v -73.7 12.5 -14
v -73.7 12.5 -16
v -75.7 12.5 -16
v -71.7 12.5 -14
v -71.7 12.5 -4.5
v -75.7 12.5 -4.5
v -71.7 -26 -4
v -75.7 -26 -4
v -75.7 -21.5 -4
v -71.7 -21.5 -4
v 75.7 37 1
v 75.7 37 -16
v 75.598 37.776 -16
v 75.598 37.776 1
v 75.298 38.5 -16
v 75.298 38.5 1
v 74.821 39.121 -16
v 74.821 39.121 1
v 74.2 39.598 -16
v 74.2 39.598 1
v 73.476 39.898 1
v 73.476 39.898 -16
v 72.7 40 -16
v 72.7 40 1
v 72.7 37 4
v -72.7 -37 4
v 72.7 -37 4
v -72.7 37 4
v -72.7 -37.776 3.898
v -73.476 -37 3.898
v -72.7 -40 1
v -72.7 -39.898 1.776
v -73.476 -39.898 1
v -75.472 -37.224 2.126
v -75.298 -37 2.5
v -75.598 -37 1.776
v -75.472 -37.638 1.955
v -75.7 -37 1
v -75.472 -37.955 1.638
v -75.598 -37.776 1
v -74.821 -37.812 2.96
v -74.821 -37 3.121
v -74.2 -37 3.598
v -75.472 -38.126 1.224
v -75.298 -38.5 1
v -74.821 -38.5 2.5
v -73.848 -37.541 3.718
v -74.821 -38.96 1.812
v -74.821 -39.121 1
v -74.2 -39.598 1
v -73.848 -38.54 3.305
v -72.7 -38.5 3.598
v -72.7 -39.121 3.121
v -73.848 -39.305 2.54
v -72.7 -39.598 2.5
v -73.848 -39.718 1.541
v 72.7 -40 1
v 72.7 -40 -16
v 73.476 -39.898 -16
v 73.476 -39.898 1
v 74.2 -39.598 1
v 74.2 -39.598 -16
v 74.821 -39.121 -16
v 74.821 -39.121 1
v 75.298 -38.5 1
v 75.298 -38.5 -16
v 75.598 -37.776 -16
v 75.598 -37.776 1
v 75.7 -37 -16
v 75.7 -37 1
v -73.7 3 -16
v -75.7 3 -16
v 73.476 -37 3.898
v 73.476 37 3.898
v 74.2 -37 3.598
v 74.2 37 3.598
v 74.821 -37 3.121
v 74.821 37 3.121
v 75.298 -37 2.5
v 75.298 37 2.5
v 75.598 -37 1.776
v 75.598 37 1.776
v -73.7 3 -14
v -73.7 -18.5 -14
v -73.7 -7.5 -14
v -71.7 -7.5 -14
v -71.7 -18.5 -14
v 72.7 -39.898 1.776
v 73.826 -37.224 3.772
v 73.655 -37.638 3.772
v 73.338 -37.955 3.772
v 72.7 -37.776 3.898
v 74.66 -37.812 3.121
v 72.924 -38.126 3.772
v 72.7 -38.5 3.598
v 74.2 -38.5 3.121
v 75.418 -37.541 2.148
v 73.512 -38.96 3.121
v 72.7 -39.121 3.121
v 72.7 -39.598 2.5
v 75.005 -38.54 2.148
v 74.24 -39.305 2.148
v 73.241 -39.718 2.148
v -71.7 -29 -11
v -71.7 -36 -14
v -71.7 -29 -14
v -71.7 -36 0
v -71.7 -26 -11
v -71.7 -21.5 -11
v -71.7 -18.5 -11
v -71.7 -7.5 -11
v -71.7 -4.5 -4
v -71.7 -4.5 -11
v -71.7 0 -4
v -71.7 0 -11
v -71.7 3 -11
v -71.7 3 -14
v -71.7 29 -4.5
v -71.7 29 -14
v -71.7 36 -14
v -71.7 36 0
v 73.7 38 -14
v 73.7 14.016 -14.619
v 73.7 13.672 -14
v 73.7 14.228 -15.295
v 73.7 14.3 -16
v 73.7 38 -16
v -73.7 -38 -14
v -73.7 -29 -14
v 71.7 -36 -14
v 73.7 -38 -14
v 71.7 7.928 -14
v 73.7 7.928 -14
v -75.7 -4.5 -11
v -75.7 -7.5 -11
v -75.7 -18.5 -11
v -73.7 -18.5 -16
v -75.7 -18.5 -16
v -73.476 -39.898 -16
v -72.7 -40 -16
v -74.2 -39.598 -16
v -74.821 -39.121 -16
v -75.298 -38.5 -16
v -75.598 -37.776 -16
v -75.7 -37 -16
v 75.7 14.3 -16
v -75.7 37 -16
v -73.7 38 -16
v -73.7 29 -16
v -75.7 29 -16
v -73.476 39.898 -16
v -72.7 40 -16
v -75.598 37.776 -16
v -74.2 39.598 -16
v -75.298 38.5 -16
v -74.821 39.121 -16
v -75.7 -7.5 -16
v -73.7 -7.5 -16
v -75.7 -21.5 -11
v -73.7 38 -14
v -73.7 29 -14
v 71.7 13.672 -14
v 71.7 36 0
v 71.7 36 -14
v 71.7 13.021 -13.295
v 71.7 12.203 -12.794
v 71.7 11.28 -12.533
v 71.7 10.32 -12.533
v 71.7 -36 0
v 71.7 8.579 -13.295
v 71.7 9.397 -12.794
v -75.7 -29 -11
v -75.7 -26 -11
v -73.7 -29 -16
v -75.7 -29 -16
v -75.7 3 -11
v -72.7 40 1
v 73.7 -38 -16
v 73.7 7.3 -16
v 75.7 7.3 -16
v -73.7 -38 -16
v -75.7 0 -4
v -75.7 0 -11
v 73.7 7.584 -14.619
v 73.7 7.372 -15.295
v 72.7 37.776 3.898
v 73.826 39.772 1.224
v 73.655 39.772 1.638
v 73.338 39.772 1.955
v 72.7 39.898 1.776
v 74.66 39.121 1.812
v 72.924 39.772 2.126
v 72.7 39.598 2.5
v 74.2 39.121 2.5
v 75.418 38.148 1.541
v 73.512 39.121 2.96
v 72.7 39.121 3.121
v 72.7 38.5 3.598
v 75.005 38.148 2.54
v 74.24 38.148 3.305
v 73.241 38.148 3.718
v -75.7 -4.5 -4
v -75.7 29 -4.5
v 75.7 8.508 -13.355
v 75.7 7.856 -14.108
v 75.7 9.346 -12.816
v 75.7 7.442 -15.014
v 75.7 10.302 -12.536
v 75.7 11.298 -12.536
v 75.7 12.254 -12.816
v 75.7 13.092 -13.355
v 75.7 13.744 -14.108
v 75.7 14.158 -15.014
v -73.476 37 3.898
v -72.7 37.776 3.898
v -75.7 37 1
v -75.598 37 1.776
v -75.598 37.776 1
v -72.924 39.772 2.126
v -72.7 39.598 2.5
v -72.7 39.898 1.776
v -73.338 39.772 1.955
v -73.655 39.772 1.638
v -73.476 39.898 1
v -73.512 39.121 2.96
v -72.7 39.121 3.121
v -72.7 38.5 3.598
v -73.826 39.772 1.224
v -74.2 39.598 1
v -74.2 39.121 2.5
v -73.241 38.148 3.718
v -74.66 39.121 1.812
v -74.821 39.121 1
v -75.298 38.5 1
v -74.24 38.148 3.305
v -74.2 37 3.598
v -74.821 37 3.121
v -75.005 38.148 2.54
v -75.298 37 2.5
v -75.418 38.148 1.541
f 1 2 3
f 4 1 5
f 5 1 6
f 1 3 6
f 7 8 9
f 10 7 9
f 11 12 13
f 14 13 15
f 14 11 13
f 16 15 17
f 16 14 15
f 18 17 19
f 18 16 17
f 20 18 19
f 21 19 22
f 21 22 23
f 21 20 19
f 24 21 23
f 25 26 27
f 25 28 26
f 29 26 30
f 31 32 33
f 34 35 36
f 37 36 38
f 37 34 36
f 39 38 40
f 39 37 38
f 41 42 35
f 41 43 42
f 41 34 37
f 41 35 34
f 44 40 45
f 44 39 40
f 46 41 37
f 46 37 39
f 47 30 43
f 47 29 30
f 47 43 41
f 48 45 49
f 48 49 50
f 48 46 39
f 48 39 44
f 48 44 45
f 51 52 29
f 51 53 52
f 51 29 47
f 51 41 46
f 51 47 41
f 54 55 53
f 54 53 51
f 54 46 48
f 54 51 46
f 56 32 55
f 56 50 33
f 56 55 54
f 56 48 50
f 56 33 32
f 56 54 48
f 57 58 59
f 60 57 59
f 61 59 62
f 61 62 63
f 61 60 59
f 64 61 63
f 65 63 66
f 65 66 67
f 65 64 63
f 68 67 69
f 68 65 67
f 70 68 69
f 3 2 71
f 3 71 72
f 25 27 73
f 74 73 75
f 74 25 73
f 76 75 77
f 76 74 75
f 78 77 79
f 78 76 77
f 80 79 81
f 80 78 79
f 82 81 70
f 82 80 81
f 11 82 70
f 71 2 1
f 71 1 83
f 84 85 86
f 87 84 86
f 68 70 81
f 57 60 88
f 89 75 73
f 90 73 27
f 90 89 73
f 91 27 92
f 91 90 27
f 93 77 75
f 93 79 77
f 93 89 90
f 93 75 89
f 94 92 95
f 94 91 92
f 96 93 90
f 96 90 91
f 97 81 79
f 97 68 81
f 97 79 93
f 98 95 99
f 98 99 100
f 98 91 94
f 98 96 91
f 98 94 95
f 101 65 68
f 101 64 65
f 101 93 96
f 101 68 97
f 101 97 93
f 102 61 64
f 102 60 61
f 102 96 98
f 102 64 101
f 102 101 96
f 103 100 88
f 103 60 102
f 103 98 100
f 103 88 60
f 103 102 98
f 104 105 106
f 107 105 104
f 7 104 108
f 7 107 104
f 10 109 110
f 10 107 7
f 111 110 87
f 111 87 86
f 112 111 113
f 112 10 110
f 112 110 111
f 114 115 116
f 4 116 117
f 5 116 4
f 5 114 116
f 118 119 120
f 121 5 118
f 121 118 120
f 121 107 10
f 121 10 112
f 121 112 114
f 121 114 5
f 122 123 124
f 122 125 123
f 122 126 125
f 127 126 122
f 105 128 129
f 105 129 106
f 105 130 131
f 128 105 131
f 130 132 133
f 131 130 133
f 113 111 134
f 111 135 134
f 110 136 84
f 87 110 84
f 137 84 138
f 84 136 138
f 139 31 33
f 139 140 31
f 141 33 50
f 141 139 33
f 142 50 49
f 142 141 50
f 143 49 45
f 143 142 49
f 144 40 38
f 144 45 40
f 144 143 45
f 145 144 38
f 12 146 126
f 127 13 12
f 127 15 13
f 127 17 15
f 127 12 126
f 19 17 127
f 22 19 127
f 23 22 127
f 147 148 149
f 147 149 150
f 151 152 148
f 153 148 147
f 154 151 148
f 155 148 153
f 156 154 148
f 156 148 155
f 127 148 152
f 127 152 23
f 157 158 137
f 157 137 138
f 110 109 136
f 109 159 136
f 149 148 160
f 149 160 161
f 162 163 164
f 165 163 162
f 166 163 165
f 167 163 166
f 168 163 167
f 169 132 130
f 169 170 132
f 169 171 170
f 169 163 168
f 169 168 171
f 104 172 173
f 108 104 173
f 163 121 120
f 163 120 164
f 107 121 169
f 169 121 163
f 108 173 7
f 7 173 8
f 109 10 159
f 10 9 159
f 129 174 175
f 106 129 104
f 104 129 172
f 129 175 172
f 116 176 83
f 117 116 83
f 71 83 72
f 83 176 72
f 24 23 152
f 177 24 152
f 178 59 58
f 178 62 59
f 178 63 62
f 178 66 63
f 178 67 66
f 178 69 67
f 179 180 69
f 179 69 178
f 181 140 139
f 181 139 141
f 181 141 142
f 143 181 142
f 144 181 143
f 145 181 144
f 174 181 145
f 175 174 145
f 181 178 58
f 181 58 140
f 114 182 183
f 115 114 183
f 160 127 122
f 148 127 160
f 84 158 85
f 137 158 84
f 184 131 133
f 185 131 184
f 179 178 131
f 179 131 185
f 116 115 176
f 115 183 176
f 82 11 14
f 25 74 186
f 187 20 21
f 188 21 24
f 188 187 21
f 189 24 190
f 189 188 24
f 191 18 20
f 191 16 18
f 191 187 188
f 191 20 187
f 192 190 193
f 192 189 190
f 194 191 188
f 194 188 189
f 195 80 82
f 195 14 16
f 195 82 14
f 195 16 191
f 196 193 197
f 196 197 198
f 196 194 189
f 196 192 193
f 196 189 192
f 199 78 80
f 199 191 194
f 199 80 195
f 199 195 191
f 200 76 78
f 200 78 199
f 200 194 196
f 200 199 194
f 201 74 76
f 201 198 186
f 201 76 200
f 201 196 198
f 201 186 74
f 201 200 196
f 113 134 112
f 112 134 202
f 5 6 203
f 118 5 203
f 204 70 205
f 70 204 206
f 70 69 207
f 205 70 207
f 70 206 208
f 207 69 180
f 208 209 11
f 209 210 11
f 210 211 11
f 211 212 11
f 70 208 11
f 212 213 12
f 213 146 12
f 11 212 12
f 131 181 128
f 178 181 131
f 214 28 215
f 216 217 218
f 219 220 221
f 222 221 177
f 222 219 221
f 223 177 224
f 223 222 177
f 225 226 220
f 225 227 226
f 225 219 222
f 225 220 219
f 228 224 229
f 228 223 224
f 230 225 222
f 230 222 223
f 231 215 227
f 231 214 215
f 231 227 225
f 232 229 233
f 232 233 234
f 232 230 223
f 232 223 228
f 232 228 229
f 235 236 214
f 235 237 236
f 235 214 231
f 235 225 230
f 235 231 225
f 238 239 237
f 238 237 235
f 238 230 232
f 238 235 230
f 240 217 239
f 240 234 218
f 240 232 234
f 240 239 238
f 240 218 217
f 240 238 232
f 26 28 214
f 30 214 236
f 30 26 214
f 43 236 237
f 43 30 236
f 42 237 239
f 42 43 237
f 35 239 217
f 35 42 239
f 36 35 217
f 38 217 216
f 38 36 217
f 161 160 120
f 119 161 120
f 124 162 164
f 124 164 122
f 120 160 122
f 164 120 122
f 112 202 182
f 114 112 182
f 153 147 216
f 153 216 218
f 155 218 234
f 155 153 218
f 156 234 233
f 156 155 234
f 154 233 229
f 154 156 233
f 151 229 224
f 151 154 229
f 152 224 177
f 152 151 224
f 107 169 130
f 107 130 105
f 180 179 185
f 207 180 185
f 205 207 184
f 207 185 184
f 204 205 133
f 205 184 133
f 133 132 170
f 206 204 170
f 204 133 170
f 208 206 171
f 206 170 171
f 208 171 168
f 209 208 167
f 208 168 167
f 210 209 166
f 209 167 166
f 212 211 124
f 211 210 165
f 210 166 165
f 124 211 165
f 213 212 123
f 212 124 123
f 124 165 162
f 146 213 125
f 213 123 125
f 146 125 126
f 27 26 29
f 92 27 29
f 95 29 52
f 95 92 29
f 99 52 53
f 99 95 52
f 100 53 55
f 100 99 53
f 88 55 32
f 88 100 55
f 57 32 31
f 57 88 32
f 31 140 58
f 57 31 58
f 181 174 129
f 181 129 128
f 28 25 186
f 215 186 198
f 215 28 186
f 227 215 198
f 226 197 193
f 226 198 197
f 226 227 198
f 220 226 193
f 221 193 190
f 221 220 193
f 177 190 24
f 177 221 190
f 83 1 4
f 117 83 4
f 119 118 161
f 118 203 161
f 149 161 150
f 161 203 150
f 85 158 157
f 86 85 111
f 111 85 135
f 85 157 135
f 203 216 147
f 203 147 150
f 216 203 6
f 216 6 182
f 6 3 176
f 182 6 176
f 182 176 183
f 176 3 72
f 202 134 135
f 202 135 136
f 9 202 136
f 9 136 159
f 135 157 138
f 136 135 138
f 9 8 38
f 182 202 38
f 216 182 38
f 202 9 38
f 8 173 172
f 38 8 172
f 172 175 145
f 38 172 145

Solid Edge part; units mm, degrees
sketch "Sketch1" plane through (0, 0, 0) normal (0, 0, 1) x (1, 0, 0)
  line L0 (-75.7, -40) -> (75.7, -40)
  line L1 (75.7, -40) -> (75.7, 40)
  line L2 (75.7, 40) -> (-75.7, 40)
  line L3 (-75.7, 40) -> (-75.7, -40)
extrude "Protrusion1" add sketch "Sketch1" along normal blind 4
sketch "Sketch2" plane through (0, 0, 0) normal (0, 0, -1) x (1, 0, 0)
  line L0 (-75.7, -40) -> (75.7, -40)
  line L1 (75.7, -40) -> (75.7, 40)
  line L2 (75.7, 40) -> (-75.7, 40)
  line L3 (-75.7, 40) -> (-75.7, -40)
  line L4 (71.7, 36) -> (-71.7, 36)
  line L5 (-71.7, 36) -> (-71.7, -36)
  line L6 (-71.7, -36) -> (71.7, -36)
  line L7 (71.7, -36) -> (71.7, 36)
extrude "Protrusion2" add sketch "Sketch2" along normal blind 16
sketch "Sketch3" plane through (-75.7, 0, -6) normal (-1, 0, 0) x (0, -1, 0)
  line L0 (-3, -10) -> (7.5, -10)
  line L1 (7.5, -10) -> (7.5, -5)
  line L2 (7.5, -5) -> (4.5, -5)
  line L3 (4.5, -5) -> (4.5, 2)
  line L4 (4.5, 2) -> (0, 2)
  line L5 (0, 2) -> (0, -5)
  line L6 (0, -5) -> (-3, -5)
  line L7 (-3, -5) -> (-3, -10)
  line L8 (18.5, -10) -> (29, -10)
  line L9 (29, -10) -> (29, -5)
  line L10 (29, -5) -> (26, -5)
  line L11 (26, -5) -> (26, 2)
  line L12 (26, 2) -> (21.5, 2)
  line L13 (21.5, 2) -> (21.5, -5)
  line L14 (21.5, -5) -> (18.5, -5)
  line L15 (18.5, -5) -> (18.5, -10)
  line L16 (-29, -10) -> (-12.5, -10)
  line L17 (-12.5, -10) -> (-12.5, 1.5)
  line L18 (-12.5, 1.5) -> (-29, 1.5)
  line L19 (-29, 1.5) -> (-29, -10)
  dimension "D1" = 16.5
  dimension "D2" = 3
  dimension "D3" = 3
  dimension "D4" = 5
  dimension "D5" = 11.5
  dimension "D6" = 7
  dimension "D7" = 7
  dimension "D8" = 4.5
  dimension "D9" = 4.5
  dimension "D10" = 3
  dimension "D11" = 3
  dimension "D12" = 7
  dimension "D13" = 9.5
  dimension "D14" = 7
  dimension "D15" = 11
extrude "Cutout1" cut sketch "Sketch3" against normal up to next
sketch "Sketch4" plane through (71.7, 0, -8) normal (-1, 0, 0) x (0, -1, 0)
  circle A0 centre (-10.8, -8) radius 3.5
  dimension "D1" = 29.2
  dimension "D2" = 7
extrude "Cutout2" cut sketch "Sketch4" against normal up to next
sketch "Sketch5" plane through (0, 24.15, -16) normal (0, 0, -1) x (0, -1, 0)
  line L0 (-11.85, 71.7) -> (60.15, 71.7)
  line L1 (60.15, 71.7) -> (60.15, -71.7)
  line L2 (60.15, -71.7) -> (-11.85, -71.7)
  line L3 (-11.85, -71.7) -> (-11.85, 71.7)
  line L4 (-13.85, 73.7) -> (62.15, 73.7)
  line L5 (62.15, 73.7) -> (62.15, -73.7)
  line L6 (62.15, -73.7) -> (-13.85, -73.7)
  line L7 (-13.85, -73.7) -> (-13.85, 73.7)
  dimension "D1" = 2
extrude "ExtrudedCutout_3" cut sketch "Sketch5" against normal blind 2
fillet "Round_1" radius 3 8 edges at (75.7, -40, -6) (75.7, 0, 4) (0, -40, 4) (-75.7, 0, 4) (0, 40, 4) (-75.7, 40, -6) (-75.7, -40, -6) (75.7, 40, -6)
